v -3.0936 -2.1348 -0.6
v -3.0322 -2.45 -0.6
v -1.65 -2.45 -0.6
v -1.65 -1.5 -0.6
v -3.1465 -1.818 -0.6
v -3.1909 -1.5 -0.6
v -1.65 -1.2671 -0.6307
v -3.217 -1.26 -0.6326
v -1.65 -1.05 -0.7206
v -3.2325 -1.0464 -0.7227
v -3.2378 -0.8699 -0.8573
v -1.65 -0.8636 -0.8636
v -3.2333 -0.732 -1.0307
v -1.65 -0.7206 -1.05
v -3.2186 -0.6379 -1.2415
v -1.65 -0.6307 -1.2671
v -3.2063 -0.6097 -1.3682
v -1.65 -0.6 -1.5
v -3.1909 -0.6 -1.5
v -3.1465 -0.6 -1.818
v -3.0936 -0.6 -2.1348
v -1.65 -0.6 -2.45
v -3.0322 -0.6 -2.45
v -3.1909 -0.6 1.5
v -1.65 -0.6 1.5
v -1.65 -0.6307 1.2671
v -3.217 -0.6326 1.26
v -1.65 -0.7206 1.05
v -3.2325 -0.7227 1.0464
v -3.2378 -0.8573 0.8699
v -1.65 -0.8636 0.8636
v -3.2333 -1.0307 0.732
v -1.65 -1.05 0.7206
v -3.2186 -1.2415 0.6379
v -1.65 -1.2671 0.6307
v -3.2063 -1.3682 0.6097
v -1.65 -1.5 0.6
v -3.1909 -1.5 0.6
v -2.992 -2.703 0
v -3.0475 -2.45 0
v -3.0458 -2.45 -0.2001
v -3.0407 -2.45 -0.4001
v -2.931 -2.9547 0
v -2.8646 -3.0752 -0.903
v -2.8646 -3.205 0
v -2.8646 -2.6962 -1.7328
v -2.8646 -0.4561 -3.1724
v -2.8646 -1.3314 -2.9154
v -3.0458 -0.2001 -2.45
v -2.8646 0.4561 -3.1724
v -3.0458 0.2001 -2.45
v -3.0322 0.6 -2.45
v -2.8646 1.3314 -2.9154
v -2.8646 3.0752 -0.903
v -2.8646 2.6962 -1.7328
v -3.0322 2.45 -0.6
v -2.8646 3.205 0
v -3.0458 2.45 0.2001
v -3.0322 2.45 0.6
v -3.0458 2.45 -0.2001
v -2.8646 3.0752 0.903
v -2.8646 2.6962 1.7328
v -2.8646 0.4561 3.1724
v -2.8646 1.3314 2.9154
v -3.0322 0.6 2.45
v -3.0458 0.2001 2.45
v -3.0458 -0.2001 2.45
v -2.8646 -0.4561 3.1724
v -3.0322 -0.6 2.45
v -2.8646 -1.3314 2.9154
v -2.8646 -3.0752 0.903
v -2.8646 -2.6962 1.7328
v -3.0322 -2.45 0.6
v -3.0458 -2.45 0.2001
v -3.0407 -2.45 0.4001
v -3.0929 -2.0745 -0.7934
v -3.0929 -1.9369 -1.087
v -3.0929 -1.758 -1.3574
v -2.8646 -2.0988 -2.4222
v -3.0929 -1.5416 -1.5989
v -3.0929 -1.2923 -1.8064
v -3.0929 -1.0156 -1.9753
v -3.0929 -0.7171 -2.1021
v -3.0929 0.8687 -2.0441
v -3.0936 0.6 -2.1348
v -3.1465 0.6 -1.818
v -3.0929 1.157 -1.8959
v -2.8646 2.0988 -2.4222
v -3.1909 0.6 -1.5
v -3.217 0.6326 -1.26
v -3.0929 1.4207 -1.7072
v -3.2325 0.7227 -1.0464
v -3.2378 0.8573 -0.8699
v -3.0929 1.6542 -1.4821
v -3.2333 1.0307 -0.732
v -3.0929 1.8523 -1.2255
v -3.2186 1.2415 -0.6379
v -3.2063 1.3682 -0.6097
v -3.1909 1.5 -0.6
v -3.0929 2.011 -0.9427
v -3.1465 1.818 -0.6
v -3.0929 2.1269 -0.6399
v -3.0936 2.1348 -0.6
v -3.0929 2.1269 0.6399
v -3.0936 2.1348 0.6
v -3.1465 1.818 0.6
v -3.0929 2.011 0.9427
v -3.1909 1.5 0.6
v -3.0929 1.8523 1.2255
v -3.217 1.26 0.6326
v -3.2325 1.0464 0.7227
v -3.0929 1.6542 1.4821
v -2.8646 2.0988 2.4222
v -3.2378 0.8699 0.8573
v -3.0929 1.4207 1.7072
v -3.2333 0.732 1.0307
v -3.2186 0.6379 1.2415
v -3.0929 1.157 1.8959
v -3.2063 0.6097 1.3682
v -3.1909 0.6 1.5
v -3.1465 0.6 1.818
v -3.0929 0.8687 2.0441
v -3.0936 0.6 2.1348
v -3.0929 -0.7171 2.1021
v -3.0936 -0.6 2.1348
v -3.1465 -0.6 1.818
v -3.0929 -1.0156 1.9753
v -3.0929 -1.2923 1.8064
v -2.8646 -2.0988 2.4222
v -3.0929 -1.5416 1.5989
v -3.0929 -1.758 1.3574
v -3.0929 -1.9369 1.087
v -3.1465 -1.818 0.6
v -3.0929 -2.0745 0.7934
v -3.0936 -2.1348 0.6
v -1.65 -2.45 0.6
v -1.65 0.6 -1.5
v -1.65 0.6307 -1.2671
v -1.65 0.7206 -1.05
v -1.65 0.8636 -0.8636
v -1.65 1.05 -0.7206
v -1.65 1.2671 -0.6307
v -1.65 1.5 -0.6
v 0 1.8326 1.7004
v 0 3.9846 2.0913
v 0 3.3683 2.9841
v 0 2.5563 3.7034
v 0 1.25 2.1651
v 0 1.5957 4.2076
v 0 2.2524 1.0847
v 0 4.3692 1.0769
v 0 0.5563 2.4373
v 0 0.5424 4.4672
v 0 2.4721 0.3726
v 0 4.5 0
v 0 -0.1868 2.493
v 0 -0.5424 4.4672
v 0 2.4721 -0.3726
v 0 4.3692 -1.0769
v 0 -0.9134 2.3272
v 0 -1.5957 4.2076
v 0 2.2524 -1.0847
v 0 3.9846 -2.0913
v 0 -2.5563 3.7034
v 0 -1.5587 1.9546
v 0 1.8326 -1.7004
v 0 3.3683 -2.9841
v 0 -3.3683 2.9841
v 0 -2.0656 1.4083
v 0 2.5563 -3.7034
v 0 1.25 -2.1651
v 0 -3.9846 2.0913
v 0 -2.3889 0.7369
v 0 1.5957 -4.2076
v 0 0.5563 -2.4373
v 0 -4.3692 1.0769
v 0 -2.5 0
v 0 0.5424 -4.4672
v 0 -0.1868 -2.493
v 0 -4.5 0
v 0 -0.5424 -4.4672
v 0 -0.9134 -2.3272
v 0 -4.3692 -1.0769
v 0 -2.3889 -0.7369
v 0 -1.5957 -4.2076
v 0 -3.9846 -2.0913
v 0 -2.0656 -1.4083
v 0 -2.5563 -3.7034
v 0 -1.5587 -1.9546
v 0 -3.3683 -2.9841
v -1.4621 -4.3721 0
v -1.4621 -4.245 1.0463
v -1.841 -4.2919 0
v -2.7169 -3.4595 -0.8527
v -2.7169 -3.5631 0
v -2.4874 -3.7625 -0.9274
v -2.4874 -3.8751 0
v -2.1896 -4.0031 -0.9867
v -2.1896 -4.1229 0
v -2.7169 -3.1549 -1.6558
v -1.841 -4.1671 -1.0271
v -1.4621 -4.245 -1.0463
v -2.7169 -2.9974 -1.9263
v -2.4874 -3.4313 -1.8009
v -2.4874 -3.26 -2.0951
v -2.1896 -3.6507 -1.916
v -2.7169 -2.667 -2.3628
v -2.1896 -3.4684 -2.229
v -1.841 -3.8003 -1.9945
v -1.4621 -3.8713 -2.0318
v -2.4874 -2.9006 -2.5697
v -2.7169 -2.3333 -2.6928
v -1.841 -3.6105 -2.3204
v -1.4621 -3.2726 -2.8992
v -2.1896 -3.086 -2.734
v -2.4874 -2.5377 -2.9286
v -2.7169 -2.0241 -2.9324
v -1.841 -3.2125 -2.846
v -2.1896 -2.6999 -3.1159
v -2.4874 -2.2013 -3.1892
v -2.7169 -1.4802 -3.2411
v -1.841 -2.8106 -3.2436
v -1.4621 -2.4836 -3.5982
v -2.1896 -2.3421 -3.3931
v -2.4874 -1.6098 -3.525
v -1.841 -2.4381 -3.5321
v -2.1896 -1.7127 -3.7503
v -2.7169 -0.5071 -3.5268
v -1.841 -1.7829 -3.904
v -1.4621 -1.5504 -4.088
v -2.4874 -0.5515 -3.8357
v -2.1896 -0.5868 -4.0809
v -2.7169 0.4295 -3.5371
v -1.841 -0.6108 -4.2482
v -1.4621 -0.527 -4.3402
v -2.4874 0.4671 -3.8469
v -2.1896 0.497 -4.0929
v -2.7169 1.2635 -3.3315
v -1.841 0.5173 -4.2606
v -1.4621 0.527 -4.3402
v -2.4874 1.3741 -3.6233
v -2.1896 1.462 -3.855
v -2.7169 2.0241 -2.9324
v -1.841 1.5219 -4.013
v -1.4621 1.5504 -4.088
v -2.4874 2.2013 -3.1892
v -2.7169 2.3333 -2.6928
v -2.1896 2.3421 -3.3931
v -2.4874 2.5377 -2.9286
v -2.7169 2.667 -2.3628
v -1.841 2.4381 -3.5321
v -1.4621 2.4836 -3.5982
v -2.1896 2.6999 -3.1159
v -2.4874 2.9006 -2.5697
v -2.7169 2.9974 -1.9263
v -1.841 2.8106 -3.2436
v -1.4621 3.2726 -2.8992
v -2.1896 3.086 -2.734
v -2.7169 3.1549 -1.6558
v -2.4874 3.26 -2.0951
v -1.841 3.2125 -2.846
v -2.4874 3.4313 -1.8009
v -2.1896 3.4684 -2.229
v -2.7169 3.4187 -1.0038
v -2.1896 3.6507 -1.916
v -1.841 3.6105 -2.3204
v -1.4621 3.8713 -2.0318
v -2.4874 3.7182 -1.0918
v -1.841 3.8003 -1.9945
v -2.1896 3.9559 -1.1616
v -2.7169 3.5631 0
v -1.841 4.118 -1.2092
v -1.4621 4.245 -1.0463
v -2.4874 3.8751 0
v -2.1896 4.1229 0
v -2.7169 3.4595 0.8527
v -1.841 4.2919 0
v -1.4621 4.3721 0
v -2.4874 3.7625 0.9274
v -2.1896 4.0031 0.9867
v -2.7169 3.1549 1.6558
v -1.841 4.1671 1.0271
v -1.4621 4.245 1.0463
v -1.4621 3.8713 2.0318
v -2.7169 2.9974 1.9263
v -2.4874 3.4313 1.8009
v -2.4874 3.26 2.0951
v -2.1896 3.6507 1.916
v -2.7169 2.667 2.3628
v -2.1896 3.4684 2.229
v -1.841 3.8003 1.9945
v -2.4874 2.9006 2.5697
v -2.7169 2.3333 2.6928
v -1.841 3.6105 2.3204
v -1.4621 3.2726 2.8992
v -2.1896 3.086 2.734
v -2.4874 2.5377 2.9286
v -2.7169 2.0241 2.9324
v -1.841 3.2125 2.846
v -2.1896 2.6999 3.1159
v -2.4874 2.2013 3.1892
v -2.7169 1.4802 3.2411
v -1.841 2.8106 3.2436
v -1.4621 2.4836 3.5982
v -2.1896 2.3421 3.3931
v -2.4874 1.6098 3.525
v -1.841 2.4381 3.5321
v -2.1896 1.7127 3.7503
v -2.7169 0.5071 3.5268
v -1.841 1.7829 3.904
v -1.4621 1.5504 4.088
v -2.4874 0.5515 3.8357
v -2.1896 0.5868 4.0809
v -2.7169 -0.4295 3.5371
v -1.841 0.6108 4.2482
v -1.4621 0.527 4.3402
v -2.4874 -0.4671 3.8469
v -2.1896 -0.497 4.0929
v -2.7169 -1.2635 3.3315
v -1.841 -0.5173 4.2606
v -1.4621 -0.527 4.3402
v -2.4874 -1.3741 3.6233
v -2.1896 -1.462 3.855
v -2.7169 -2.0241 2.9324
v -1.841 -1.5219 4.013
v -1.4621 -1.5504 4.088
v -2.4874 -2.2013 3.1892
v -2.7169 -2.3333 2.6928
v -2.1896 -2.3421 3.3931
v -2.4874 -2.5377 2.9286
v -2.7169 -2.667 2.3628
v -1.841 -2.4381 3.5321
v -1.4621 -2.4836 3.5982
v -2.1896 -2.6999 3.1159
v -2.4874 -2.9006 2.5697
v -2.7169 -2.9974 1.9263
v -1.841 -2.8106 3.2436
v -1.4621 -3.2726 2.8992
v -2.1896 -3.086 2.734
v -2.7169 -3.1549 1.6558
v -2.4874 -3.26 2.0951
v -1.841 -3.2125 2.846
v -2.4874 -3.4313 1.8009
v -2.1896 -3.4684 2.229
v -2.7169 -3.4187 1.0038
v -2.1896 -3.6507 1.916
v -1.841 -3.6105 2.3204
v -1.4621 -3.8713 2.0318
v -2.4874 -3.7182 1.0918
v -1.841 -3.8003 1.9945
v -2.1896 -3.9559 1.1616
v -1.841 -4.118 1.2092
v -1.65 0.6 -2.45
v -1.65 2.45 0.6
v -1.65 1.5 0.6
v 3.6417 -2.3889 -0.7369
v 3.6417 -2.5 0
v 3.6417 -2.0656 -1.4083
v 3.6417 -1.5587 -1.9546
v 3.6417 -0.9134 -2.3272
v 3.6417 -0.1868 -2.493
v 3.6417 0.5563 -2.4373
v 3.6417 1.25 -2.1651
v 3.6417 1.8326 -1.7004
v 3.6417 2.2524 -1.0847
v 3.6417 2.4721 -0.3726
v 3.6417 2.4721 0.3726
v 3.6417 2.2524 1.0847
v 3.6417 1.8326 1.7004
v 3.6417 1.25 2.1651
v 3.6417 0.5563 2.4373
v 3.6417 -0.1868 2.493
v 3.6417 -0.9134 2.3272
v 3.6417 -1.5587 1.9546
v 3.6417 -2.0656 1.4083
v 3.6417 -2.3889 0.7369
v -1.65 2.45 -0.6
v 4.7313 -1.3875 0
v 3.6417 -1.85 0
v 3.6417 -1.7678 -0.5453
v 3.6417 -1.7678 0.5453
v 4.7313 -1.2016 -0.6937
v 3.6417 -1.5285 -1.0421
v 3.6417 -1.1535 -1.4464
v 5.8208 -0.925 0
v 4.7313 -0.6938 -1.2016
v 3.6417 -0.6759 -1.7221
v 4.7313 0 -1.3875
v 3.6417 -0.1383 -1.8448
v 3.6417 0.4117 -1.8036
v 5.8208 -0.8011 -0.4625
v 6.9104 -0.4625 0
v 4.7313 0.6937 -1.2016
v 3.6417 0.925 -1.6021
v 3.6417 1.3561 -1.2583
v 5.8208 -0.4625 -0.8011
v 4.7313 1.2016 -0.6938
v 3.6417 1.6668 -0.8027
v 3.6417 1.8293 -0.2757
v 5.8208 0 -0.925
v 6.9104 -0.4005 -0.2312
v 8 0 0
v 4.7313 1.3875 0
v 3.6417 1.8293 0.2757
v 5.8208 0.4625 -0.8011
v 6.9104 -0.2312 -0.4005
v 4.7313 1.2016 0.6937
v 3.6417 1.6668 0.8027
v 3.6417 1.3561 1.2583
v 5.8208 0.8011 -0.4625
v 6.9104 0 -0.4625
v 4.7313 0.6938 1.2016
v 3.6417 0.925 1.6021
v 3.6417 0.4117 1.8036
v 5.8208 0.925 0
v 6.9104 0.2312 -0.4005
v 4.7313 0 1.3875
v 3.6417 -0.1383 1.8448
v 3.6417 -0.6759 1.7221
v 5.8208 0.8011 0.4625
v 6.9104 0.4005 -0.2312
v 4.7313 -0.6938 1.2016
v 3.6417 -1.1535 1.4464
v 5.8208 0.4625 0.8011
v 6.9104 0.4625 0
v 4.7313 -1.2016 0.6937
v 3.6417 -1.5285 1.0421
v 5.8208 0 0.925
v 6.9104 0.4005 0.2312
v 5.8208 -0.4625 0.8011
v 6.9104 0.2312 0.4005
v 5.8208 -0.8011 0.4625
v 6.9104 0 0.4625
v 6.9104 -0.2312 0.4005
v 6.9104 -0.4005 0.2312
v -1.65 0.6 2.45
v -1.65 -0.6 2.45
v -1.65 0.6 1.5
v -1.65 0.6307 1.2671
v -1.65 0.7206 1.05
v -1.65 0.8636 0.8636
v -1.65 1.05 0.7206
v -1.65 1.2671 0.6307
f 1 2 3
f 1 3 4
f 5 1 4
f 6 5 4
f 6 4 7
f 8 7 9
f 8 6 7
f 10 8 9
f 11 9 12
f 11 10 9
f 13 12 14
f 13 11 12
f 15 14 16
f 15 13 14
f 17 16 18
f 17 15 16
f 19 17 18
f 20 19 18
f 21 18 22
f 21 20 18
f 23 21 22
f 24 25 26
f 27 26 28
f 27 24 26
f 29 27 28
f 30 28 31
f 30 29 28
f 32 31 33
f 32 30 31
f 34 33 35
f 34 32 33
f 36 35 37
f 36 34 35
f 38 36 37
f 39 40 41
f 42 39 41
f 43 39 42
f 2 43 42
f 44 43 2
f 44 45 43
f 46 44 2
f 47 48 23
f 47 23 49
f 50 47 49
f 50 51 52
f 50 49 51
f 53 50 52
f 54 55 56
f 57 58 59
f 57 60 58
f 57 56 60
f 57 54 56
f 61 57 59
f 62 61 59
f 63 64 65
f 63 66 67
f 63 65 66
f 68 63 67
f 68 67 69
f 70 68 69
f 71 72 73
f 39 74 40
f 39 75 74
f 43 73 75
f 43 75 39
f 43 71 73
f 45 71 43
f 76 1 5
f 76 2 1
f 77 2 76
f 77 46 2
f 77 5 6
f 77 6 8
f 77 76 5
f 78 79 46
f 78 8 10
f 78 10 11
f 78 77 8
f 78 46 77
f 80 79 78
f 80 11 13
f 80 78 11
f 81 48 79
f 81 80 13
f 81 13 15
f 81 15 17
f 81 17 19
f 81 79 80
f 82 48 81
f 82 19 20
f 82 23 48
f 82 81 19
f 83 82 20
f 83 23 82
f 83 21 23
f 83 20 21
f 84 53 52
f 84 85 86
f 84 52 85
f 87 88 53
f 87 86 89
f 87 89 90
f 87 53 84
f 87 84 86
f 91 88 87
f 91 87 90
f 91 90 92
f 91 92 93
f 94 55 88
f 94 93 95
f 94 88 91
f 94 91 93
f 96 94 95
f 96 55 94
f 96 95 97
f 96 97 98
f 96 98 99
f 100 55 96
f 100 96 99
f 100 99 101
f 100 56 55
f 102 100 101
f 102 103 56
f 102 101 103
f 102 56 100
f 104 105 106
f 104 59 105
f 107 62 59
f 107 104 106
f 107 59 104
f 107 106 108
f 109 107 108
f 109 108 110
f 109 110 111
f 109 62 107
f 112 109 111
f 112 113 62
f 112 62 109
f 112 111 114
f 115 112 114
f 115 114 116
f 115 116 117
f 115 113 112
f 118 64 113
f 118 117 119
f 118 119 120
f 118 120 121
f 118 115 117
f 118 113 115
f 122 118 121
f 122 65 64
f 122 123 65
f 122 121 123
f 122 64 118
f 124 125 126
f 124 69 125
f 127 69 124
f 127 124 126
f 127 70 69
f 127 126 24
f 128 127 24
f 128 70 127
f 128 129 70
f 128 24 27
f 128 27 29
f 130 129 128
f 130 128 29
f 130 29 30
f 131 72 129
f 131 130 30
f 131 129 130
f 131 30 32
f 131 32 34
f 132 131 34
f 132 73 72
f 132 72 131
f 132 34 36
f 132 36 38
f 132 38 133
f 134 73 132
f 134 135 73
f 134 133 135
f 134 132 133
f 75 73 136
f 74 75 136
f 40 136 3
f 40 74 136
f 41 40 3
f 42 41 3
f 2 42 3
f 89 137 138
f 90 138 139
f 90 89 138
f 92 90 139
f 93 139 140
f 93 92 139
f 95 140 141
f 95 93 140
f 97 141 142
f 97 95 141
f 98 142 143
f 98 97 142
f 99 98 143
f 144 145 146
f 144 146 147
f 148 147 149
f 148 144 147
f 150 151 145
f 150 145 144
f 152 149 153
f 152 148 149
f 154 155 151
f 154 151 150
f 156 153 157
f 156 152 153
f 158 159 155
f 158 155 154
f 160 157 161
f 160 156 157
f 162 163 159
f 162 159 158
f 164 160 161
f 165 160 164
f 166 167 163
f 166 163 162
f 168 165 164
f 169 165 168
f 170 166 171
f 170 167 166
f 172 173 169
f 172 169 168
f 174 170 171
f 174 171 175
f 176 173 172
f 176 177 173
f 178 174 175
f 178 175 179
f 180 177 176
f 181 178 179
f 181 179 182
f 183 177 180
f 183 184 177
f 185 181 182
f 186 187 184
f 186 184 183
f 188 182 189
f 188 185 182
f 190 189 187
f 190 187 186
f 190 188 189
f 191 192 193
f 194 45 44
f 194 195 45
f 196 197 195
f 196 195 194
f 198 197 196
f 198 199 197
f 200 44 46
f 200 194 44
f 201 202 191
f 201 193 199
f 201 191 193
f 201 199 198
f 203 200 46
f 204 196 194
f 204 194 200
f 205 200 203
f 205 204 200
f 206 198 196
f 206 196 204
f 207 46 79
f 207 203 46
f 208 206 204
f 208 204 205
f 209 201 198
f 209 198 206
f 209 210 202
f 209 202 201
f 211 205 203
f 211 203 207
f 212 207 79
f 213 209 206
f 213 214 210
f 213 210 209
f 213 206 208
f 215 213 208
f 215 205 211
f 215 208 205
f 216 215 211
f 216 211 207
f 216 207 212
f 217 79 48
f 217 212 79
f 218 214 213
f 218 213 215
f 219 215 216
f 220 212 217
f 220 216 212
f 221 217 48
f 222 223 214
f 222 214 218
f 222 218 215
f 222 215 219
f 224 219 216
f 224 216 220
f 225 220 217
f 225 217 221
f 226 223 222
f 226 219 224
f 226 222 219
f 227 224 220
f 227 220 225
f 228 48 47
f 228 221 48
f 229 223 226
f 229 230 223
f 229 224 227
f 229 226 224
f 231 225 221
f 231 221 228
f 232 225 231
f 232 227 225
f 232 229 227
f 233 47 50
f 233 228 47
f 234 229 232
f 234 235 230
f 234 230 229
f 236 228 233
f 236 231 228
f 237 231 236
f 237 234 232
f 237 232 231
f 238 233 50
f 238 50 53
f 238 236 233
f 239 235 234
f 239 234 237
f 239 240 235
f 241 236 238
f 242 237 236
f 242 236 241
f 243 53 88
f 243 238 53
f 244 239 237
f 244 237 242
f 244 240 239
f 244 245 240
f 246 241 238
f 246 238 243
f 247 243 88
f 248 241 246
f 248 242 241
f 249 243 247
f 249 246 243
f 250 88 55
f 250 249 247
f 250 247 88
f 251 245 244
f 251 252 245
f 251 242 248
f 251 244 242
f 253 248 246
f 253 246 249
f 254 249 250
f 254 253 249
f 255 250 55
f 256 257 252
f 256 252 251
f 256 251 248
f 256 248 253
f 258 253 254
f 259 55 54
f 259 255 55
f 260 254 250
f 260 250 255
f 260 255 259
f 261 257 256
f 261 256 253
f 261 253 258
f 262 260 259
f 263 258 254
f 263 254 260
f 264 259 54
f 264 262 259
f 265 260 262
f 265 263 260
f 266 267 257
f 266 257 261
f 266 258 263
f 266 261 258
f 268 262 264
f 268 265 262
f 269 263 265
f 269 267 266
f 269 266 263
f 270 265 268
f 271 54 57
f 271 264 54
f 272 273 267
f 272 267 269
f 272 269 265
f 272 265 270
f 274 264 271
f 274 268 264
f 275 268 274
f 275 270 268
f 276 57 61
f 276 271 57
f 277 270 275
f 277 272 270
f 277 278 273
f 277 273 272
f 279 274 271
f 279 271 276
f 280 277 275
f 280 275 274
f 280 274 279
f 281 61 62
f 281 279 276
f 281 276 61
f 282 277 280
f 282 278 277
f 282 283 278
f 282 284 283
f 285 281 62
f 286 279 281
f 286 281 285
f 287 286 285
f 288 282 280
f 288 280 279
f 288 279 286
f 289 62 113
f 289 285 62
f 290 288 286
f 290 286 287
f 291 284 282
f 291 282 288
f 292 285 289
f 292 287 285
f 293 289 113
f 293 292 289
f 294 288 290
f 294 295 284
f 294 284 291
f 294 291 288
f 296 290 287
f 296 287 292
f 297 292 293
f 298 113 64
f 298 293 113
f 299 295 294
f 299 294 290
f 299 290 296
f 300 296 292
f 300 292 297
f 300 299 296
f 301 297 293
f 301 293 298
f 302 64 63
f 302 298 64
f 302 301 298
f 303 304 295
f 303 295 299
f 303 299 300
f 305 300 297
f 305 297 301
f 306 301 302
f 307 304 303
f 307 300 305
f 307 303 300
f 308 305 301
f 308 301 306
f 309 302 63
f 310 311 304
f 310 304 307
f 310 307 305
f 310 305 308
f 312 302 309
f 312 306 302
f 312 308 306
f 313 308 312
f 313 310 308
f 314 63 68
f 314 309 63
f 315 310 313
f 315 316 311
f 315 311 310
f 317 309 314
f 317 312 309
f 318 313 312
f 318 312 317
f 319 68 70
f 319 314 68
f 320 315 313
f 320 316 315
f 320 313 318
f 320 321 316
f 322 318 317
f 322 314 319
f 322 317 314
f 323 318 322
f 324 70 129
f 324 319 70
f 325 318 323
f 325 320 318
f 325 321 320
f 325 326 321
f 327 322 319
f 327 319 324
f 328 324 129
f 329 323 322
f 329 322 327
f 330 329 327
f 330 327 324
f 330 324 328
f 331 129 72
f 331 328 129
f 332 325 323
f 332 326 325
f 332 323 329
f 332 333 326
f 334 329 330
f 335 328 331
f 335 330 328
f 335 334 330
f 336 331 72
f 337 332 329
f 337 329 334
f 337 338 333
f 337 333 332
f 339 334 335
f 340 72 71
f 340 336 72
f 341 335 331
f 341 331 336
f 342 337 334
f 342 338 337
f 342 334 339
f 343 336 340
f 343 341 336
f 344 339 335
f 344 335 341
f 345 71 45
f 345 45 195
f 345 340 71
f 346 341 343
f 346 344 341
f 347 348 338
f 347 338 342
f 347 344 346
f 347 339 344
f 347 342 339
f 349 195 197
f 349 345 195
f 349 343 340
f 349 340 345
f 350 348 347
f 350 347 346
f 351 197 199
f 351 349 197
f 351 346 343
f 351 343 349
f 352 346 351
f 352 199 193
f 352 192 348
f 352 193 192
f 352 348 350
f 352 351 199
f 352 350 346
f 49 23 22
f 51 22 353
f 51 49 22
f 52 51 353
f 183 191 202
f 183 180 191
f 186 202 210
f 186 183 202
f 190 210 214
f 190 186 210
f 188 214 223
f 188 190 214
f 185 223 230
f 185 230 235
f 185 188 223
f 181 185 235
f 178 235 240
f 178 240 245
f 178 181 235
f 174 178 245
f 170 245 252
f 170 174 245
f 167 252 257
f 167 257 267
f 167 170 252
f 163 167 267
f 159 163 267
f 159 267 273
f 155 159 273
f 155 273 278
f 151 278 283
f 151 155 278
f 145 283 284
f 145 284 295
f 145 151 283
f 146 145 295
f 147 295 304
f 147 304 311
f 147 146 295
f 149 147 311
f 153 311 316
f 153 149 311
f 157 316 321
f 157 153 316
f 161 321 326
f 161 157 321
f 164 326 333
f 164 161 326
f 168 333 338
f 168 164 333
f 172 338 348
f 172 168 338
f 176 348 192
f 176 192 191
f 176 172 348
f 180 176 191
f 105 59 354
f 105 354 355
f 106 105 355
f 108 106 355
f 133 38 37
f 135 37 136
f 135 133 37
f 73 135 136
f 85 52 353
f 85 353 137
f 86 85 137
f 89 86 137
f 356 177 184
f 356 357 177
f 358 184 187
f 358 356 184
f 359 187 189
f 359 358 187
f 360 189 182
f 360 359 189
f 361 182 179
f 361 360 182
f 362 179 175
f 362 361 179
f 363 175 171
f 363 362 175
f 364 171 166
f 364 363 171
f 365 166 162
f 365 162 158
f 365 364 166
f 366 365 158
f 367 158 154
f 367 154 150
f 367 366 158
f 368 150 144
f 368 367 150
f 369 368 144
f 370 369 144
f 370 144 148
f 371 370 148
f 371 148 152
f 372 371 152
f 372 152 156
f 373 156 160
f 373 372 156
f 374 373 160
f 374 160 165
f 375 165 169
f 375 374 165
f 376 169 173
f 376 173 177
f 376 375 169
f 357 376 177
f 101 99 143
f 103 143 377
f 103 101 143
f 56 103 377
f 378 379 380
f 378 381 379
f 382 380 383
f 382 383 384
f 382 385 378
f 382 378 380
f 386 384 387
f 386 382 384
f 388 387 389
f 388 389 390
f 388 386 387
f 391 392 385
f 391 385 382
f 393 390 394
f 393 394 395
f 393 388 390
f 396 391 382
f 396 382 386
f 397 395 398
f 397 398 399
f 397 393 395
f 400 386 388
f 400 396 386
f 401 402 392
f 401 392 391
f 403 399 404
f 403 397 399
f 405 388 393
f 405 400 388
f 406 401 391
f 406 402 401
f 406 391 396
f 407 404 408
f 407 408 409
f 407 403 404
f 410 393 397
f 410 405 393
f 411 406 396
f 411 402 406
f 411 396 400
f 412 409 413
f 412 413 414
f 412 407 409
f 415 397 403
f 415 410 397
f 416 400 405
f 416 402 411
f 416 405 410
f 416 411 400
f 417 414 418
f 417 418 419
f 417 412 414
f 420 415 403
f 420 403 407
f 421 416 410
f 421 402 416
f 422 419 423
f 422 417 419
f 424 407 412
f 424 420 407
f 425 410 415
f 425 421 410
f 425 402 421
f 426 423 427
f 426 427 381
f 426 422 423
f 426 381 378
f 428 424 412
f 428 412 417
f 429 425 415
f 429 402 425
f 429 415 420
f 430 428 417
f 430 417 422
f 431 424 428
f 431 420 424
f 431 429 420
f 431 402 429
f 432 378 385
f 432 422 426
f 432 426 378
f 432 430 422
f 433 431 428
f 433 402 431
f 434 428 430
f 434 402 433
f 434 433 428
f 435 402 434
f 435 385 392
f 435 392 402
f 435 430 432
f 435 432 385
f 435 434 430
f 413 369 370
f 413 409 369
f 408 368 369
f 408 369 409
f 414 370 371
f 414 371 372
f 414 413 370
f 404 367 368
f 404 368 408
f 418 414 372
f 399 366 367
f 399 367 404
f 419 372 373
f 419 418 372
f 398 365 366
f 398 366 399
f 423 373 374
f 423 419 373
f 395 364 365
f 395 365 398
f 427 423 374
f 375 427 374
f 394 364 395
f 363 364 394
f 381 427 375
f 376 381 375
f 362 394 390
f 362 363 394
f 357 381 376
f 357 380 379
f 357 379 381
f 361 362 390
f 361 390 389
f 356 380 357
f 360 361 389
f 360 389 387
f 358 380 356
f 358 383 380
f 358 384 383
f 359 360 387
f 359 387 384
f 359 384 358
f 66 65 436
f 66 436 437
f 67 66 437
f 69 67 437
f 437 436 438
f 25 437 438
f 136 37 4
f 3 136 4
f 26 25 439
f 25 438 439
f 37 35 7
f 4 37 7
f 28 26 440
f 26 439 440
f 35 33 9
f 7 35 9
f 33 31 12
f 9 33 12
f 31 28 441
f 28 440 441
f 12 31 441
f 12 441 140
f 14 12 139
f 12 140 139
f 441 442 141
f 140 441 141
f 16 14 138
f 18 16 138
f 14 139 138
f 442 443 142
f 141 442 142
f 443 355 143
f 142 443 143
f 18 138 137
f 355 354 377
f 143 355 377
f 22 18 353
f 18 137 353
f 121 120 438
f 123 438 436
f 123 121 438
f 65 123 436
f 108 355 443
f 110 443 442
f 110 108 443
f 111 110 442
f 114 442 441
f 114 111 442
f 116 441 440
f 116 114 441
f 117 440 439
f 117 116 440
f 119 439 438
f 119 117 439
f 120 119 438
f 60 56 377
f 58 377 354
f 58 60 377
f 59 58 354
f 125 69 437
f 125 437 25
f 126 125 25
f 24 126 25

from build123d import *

# Parameters (mm, degrees)
CUT_EXTRUDE1_DEPTH = 1.65


with BuildPart() as part:
    # Sketch1 → Revolve1 (revolve)
    with BuildSketch(Plane.XY, mode=Mode.PRIVATE) as revolve1_sk:
        with BuildLine():
            Line((-1.462050681, 4.37208714), (0, 4.5))
            Line((0, 4.5), (0, 2.5))
            Line((0, 2.5), (3.641673123, 2.5))
            Line((3.641673123, 2.5), (3.641673123, 1.85))
            Line((3.641673123, 1.85), (8, 0))
            Line((8, 0), (-3.3, 0))
            ThreePointArc((-3.3, 0), (-3.190657425, 1.617218351), (-2.864619959, 3.205))
            ThreePointArc((-2.864619959, 3.205), (-2.346005844, 4.008071364), (-1.462050681, 4.37208714))
        make_face()
    revolve(revolve1_sk.sketch.rotate(Axis((-3.3, 0, 0), (1, 0, 0)), 180), axis=Axis((-3.3, 0, 0), (1, 0, 0)))

    # Sketch2 → Cut-Extrude1 (cut)
    with BuildSketch(Plane(origin=(-3.3, 0, 0), x_dir=(0, 0, -1), z_dir=(1, 0, 0))):
        with BuildLine():
            Line((0.6, 1.5), (0.6, 2.45))
            Line((0.6, 2.45), (-0.6, 2.45))
            Line((-0.6, 2.45), (-0.6, 1.5))
            ThreePointArc((-0.6, 1.5), (-0.863603897, 0.863603897), (-1.5, 0.6))
            Line((-1.5, 0.6), (-2.45, 0.6))
            Line((-2.45, 0.6), (-2.45, -0.6))
            Line((-2.45, -0.6), (-1.5, -0.6))
            ThreePointArc((-1.5, -0.6), (-0.863603897, -0.863603897), (-0.6, -1.5))
            Line((-0.6, -1.5), (-0.6, -2.45))
            Line((-0.6, -2.45), (0.6, -2.45))
            Line((0.6, -2.45), (0.6, -1.5))
            ThreePointArc((0.6, -1.5), (0.863603897, -0.863603897), (1.5, -0.6))
            Line((1.5, -0.6), (2.45, -0.6))
            Line((2.45, -0.6), (2.45, 0.6))
            Line((2.45, 0.6), (1.5, 0.6))
            ThreePointArc((1.5, 0.6), (0.863603897, 0.863603897), (0.6, 1.5))
        make_face()
    extrude(amount=CUT_EXTRUDE1_DEPTH, mode=Mode.SUBTRACT)


solid = part.part
